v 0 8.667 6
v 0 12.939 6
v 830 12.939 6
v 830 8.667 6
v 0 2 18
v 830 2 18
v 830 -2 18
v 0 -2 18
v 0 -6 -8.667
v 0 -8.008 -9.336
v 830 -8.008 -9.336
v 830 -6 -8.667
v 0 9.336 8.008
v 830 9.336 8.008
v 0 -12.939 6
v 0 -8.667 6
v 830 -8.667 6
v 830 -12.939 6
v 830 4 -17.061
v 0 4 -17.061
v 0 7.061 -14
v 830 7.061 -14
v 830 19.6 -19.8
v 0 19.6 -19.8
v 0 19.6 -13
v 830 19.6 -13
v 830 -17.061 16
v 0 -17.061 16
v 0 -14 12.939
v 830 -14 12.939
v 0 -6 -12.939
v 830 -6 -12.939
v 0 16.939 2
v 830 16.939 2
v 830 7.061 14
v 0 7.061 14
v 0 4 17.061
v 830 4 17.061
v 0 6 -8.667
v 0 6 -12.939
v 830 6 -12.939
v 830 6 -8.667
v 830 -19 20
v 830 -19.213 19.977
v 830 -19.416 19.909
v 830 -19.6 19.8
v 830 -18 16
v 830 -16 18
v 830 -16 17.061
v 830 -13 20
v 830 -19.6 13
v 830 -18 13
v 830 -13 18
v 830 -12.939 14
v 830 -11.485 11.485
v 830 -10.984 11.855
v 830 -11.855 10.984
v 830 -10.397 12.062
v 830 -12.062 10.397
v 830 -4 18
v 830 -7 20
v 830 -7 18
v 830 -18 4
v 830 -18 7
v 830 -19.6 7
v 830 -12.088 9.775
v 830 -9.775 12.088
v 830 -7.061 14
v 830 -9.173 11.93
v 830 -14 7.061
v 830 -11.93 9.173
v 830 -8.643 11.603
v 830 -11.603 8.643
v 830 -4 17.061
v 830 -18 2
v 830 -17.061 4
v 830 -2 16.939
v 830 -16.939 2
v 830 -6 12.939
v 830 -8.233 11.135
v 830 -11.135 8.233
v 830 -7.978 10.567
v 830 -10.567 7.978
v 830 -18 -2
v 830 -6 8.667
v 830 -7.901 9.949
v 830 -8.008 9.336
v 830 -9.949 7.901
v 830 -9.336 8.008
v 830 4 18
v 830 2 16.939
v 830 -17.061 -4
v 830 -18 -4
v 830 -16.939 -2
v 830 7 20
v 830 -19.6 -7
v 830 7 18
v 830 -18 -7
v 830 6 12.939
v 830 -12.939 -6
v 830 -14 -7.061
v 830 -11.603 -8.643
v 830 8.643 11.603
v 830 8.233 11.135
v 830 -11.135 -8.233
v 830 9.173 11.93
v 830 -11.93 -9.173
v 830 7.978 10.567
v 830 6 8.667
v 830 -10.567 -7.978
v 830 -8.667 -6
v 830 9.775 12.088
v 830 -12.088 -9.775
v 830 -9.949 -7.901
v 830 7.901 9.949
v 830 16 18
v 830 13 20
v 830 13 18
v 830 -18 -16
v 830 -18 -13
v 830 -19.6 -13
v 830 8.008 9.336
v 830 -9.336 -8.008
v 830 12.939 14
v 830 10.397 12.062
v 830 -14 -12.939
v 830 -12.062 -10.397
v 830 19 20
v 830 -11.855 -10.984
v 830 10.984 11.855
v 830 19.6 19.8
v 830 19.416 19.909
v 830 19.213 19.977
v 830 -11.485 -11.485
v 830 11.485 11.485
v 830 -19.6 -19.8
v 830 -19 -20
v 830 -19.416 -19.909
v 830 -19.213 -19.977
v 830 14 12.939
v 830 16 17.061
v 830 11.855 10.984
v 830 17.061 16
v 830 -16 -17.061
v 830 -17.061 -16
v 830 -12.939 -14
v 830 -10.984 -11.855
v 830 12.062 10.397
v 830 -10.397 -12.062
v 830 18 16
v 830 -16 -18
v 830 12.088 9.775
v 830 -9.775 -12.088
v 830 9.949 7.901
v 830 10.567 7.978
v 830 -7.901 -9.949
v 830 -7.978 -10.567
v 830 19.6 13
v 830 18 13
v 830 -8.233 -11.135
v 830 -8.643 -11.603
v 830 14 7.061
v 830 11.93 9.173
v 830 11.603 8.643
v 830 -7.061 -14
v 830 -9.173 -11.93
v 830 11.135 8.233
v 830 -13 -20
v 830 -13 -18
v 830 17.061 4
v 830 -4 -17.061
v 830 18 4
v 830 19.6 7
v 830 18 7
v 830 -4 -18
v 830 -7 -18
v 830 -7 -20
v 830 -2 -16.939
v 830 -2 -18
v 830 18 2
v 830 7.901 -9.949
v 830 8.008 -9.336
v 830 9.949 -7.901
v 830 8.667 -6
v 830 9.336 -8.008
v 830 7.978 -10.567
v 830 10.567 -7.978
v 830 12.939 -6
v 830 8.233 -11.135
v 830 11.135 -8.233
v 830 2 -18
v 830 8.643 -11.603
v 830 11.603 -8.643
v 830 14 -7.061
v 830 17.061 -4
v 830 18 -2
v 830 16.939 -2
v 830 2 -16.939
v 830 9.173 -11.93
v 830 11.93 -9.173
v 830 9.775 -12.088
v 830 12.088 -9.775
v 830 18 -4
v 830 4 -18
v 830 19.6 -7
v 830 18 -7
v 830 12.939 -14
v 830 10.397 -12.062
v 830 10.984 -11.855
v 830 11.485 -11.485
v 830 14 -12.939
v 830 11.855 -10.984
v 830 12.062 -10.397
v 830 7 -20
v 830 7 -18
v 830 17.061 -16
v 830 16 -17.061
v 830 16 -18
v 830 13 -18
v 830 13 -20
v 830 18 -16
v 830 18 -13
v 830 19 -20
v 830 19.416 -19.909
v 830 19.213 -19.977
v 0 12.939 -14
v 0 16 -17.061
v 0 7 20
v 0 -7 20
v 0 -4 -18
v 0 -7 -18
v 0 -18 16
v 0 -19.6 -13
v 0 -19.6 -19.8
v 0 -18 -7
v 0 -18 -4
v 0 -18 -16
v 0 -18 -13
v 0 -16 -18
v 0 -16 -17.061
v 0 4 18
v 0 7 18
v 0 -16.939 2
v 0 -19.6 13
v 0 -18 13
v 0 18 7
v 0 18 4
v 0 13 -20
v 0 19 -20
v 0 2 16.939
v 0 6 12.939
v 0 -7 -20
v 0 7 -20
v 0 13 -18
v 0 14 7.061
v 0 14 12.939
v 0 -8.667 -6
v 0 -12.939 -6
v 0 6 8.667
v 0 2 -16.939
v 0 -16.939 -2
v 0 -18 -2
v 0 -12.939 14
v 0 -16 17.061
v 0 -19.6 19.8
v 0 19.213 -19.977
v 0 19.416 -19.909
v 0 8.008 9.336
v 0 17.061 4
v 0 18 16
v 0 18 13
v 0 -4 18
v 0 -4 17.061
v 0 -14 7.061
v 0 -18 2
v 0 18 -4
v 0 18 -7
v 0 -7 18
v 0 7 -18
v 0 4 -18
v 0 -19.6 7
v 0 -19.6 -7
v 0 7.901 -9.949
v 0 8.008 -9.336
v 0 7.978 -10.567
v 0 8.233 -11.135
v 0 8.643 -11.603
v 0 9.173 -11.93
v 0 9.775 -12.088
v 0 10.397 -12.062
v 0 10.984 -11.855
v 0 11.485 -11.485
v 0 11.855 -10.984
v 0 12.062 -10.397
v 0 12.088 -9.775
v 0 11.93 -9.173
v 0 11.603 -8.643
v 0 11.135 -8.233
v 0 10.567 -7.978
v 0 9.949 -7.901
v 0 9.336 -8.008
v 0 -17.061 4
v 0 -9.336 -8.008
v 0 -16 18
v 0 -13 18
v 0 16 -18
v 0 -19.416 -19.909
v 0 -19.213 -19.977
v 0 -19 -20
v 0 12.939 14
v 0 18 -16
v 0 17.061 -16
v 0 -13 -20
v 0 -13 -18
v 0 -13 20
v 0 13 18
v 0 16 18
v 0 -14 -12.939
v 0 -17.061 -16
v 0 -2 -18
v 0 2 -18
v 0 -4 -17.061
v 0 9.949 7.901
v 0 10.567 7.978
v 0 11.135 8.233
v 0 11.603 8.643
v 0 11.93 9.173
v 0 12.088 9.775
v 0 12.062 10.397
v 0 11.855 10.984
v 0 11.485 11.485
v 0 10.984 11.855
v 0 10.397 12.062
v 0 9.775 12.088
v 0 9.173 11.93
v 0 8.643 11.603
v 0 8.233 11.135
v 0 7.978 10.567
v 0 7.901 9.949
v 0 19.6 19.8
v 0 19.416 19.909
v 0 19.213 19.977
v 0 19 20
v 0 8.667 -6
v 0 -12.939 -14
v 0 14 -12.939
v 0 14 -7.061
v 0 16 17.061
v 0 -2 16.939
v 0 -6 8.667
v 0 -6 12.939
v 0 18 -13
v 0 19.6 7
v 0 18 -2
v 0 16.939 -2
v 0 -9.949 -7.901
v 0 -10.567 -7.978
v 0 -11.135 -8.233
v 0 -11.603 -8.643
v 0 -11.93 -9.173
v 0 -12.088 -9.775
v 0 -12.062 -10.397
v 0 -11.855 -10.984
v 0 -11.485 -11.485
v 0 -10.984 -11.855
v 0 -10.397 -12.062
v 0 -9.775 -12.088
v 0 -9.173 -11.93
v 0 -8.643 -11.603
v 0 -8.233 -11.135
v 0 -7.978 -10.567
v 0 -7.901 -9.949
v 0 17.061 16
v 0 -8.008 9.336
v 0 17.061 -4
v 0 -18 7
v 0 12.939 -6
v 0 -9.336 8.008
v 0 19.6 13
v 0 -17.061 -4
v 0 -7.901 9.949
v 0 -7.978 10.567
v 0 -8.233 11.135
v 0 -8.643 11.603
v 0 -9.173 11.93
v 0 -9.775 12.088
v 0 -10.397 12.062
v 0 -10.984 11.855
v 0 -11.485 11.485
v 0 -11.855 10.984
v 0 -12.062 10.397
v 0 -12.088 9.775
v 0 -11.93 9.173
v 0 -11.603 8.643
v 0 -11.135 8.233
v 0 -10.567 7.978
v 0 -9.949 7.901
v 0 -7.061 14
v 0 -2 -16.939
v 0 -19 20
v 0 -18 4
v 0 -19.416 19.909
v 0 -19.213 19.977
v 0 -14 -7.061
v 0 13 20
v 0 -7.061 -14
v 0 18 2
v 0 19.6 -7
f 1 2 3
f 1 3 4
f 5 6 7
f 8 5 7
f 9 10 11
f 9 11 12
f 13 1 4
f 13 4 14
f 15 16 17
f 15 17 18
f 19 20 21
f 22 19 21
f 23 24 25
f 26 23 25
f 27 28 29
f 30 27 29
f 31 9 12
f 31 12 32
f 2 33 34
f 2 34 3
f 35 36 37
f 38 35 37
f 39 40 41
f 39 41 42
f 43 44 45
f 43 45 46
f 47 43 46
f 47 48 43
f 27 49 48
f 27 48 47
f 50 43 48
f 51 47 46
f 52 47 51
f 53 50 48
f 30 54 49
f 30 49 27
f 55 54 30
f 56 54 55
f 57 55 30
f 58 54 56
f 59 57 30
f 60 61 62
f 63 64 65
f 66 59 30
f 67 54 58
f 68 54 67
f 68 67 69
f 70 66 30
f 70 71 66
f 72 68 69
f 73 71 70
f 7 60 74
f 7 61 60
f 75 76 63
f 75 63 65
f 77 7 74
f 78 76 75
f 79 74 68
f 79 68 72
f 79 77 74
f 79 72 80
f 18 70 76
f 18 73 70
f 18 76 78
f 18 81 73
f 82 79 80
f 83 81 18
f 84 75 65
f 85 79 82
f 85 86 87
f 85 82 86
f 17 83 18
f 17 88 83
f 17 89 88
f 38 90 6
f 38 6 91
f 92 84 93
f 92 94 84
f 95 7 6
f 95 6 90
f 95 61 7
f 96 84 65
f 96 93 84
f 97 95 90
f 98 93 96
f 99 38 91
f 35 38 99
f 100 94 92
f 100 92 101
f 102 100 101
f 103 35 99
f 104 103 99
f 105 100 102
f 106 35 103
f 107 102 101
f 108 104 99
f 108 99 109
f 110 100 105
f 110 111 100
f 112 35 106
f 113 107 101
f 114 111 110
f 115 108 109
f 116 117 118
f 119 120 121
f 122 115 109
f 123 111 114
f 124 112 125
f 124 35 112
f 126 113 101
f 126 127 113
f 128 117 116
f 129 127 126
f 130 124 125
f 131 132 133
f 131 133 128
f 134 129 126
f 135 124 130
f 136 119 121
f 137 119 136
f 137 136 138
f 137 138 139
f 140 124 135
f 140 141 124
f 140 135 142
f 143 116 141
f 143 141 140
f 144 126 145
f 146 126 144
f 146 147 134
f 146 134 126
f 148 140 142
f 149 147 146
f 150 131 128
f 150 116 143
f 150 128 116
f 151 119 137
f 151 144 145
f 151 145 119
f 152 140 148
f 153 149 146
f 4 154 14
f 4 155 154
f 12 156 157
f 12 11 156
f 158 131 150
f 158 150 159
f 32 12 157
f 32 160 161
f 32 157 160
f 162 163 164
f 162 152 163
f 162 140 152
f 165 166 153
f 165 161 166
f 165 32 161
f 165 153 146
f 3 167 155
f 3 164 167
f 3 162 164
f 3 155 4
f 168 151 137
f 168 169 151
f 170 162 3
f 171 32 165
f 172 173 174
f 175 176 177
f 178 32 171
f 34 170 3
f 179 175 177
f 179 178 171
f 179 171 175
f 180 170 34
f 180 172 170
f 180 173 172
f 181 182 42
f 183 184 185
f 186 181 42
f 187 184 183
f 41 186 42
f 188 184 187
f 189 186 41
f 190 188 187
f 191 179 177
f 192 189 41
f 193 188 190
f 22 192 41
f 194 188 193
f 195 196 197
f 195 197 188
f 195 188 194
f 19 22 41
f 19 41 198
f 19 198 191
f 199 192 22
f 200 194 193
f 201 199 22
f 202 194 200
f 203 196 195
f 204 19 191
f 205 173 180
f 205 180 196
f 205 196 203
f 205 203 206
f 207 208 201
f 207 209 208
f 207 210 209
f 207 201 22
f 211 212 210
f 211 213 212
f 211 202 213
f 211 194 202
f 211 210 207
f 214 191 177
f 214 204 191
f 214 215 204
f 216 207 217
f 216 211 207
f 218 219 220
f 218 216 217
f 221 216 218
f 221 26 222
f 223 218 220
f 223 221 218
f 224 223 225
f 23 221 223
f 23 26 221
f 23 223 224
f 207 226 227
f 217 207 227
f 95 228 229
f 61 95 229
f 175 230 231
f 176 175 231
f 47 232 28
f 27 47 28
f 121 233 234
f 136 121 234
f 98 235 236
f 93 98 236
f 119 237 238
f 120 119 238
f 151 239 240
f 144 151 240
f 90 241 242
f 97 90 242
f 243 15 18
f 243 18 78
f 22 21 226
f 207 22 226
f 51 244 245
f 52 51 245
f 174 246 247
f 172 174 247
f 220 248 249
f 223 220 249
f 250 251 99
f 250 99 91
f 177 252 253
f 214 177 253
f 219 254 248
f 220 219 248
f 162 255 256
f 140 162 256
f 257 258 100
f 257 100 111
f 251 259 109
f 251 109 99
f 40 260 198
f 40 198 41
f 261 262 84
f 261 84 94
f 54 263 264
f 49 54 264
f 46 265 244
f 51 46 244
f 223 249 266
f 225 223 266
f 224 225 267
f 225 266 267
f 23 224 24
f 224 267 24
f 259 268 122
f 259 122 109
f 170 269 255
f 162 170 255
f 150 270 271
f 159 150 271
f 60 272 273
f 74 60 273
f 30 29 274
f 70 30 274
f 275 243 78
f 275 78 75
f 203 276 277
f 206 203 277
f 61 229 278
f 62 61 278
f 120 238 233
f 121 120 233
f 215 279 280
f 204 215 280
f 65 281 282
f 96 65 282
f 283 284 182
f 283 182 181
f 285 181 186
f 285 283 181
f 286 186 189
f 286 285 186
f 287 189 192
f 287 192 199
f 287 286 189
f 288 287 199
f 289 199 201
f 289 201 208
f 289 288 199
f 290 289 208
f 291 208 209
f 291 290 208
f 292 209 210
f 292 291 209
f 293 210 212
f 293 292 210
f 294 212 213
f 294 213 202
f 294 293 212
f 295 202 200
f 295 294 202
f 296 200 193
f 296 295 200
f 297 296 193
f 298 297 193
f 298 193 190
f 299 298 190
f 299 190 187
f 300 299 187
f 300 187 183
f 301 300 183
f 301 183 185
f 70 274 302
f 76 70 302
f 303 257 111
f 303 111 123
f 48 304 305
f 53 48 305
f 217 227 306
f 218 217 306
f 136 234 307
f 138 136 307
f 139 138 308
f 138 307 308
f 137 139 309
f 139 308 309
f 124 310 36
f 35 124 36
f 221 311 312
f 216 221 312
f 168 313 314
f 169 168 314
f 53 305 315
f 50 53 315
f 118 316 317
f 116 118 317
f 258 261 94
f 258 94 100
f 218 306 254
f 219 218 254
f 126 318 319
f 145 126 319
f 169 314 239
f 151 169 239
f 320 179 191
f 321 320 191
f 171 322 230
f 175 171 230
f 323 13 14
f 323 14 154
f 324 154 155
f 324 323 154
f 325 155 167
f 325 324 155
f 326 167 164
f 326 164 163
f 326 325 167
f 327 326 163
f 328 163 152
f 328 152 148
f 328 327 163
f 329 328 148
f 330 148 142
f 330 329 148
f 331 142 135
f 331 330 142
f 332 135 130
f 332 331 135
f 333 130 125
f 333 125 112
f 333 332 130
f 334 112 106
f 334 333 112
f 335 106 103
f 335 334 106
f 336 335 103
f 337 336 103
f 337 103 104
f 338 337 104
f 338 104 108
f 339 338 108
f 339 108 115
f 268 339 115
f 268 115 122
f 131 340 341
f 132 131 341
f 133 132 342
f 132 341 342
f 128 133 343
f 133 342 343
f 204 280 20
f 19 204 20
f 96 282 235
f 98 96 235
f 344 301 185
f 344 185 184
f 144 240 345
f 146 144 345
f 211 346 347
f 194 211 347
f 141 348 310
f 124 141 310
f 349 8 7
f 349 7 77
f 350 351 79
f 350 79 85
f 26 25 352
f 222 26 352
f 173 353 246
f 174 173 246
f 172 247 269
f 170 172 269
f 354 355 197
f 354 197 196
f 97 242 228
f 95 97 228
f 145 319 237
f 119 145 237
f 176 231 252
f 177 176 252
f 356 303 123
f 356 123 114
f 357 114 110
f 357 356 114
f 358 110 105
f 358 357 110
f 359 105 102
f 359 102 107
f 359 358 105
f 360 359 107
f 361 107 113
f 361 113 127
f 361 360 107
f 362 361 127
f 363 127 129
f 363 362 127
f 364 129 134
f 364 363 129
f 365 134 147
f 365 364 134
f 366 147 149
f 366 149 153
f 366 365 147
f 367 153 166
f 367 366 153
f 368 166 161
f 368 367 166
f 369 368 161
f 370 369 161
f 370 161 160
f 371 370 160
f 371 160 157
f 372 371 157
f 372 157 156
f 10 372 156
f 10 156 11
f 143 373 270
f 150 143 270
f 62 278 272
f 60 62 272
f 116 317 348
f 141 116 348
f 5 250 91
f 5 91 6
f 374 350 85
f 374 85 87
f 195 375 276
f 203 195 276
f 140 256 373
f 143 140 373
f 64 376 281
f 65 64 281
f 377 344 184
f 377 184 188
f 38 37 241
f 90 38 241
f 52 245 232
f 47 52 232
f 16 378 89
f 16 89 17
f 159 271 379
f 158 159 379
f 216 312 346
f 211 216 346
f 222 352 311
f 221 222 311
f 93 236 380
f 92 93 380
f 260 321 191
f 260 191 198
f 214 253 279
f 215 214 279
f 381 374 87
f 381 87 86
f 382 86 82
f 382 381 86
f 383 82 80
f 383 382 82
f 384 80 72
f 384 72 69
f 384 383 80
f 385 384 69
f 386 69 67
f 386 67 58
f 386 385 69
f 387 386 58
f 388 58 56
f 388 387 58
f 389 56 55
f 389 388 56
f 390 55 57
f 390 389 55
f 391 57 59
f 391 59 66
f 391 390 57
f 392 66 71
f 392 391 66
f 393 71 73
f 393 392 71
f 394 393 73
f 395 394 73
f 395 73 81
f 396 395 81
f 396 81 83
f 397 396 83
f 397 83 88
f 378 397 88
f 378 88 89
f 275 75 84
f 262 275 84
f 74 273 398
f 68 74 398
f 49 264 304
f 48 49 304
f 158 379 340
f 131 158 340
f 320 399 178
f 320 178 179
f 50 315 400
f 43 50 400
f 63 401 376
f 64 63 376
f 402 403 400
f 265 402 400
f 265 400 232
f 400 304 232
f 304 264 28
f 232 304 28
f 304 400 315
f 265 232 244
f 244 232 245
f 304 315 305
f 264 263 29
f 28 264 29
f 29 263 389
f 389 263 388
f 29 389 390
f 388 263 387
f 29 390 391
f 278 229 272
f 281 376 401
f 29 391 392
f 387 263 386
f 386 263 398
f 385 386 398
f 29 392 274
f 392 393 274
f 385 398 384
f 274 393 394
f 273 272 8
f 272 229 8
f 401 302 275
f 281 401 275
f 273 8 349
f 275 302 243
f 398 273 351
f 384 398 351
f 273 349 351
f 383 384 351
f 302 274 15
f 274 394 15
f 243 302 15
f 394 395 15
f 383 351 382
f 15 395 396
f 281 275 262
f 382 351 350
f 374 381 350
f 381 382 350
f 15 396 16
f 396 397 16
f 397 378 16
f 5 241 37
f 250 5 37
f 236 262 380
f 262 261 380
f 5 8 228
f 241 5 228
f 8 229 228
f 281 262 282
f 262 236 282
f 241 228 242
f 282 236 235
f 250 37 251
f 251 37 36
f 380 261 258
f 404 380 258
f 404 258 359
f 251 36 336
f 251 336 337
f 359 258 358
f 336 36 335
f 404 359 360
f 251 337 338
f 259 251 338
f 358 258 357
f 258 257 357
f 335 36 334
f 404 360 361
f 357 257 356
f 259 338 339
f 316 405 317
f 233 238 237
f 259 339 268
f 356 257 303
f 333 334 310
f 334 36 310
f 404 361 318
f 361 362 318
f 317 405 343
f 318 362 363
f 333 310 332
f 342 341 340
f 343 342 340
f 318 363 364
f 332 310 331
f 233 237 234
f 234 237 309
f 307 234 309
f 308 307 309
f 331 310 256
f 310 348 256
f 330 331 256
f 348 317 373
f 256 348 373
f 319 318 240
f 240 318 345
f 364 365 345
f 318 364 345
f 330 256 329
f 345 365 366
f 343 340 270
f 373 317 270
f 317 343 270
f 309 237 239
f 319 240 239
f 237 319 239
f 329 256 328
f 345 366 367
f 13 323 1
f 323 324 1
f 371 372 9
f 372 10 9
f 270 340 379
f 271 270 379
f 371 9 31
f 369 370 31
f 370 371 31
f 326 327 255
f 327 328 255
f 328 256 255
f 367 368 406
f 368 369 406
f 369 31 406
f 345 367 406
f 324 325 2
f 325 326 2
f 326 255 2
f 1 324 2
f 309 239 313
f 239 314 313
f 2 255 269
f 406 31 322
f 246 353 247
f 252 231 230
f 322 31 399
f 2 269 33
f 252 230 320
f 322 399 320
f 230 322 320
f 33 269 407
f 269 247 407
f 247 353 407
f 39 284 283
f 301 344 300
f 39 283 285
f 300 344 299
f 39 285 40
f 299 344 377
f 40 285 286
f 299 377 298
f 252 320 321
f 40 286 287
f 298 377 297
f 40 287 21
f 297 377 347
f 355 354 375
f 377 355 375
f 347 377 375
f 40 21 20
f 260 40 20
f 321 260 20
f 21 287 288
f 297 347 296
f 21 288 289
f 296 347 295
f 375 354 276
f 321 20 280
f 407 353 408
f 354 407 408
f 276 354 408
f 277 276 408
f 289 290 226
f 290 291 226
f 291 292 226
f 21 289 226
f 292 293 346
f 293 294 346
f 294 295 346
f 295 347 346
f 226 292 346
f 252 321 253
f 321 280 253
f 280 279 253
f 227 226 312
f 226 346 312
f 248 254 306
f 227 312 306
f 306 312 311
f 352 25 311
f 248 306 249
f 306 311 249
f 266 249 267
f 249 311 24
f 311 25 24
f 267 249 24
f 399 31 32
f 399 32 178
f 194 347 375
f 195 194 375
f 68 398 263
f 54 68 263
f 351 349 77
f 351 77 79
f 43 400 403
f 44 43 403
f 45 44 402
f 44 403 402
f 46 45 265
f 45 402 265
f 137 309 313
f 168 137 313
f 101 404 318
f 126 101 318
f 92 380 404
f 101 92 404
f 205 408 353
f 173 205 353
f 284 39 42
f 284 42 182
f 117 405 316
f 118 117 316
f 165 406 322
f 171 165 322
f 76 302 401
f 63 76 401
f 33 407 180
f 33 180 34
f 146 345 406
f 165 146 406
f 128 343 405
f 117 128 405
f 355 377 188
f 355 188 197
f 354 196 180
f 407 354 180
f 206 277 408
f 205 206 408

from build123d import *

# Parameters (mm, degrees)
BOSS_EXTRUDE1_DEPTH = 830


with BuildPart() as part:
    # Sketch1 → Boss-Extrude1 (new body)
    with BuildSketch(Plane(origin=(0, 0, 0), x_dir=(0, 0, -1), z_dir=(1, 0, 0))):
        with BuildLine():
            Line((-20, 19), (-20, 13))
            Line((-20, 13), (-18, 13))
            Line((-18, 13), (-18, 16))
            Line((-18, 16), (-17.060660172, 16))
            Line((-17.060660172, 16), (-14, 12.939339828))
            Line((-14, 12.939339828), (-14, 7.060660172))
            Line((-14, 7.060660172), (-17.060660172, 4))
            Line((-17.060660172, 4), (-18, 4))
            Line((-18, 4), (-18, 7))
            Line((-18, 7), (-20, 7))
            Line((-20, 7), (-20, -7))
            Line((-20, -7), (-18, -7))
            Line((-18, -7), (-18, -4))
            Line((-18, -4), (-17.060660172, -4))
            Line((-17.060660172, -4), (-14, -7.060660172))
            Line((-14, -7.060660172), (-14, -12.939339828))
            Line((-14, -12.939339828), (-17.060660172, -16))
            Line((-17.060660172, -16), (-18, -16))
            Line((-18, -16), (-18, -13))
            Line((-18, -13), (-20, -13))
            Line((-20, -13), (-20, -19))
            ThreePointArc((-20, -19), (-19.948683298, -19.316227766), (-19.8, -19.6))
            Line((-19.8, -19.6), (-13, -19.6))
            Line((-13, -19.6), (-13, -18))
            Line((-13, -18), (-16, -18))
            Line((-16, -18), (-16, -17.060660172))
            Line((-16, -17.060660172), (-12.939339828, -14))
            Line((-12.939339828, -14), (-7.060660172, -14))
            Line((-7.060660172, -14), (-4, -17.060660172))
            Line((-4, -17.060660172), (-4, -18))
            Line((-4, -18), (-7, -18))
            Line((-7, -18), (-7, -19.6))
            Line((-7, -19.6), (7, -19.6))
            Line((7, -19.6), (7, -18))
            Line((7, -18), (4, -18))
            Line((4, -18), (4, -17.060660172))
            Line((4, -17.060660172), (7.060660172, -14))
            Line((7.060660172, -14), (12.939339828, -14))
            Line((12.939339828, -14), (16, -17.060660172))
            Line((16, -17.060660172), (16, -18))
            Line((16, -18), (13, -18))
            Line((13, -18), (13, -19.6))
            Line((13, -19.6), (19.8, -19.6))
            ThreePointArc((19.8, -19.6), (19.948683298, -19.316227766), (20, -19))
            Line((20, -19), (20, -13))
            Line((20, -13), (18, -13))
            Line((18, -13), (18, -16))
            Line((18, -16), (17.060660172, -16))
            Line((17.060660172, -16), (14, -12.939339828))
            Line((14, -12.939339828), (14, -7.060660172))
            Line((14, -7.060660172), (17.060660172, -4))
            Line((17.060660172, -4), (18, -4))
            Line((18, -4), (18, -7))
            Line((18, -7), (20, -7))
            Line((20, -7), (20, 7))
            Line((20, 7), (18, 7))
            Line((18, 7), (18, 4))
            Line((18, 4), (17.060660172, 4))
            Line((17.060660172, 4), (14, 7.060660172))
            Line((14, 7.060660172), (14, 12.939339828))
            Line((14, 12.939339828), (17.060660172, 16))
            Line((17.060660172, 16), (18, 16))
            Line((18, 16), (18, 13))
            Line((18, 13), (20, 13))
            Line((20, 13), (20, 19))
            ThreePointArc((20, 19), (19.948683298, 19.316227766), (19.8, 19.6))
            Line((19.8, 19.6), (13, 19.6))
            Line((13, 19.6), (13, 18))
            Line((13, 18), (16, 18))
            Line((16, 18), (16, 17.060660172))
            Line((16, 17.060660172), (12.939339828, 14))
            Line((12.939339828, 14), (7.060660172, 14))
            Line((7.060660172, 14), (4, 17.060660172))
            Line((4, 17.060660172), (4, 18))
            Line((4, 18), (7, 18))
            Line((7, 18), (7, 19.6))
            Line((7, 19.6), (-7, 19.6))
            Line((-7, 19.6), (-7, 18))
            Line((-7, 18), (-4, 18))
            Line((-4, 18), (-4, 17.060660172))
            Line((-4, 17.060660172), (-7.060660172, 14))
            Line((-7.060660172, 14), (-12.939339828, 14))
            Line((-12.939339828, 14), (-16, 17.060660172))
            Line((-16, 17.060660172), (-16, 18))
            Line((-16, 18), (-13, 18))
            Line((-13, 18), (-13, 19.6))
            Line((-13, 19.6), (-19.8, 19.6))
            ThreePointArc((-19.8, 19.6), (-19.948683298, 19.316227766), (-20, 19))
        make_face()
        with BuildLine():
            Line((-16.939339828, 2), (-18, 2))
            Line((-18, 2), (-18, -2))
            Line((-18, -2), (-16.939339828, -2))
            Line((-16.939339828, -2), (-12.939339828, -6))
            Line((-12.939339828, -6), (-8.666662697, -6))
            Line((-8.666662697, -6), (-9.335919912, -8.007765667))
            ThreePointArc((-9.335919912, -8.007765667), (-11.48492424, -11.48492424), (-8.007765667, -9.335919912))
            Line((-8.007765667, -9.335919912), (-6, -8.666662697))
            Line((-6, -8.666662697), (-6, -12.939339828))
            Line((-6, -12.939339828), (-2, -16.939339828))
            Line((-2, -16.939339828), (-2, -18))
            Line((-2, -18), (2, -18))
            Line((2, -18), (2, -16.939339828))
            Line((2, -16.939339828), (6, -12.939339828))
            Line((6, -12.939339828), (6, -8.666662697))
            Line((6, -8.666662697), (8.007765667, -9.335919912))
            ThreePointArc((8.007765667, -9.335919912), (11.48492424, -11.48492424), (9.335919912, -8.007765667))
            Line((9.335919912, -8.007765667), (8.666662697, -6))
            Line((8.666662697, -6), (12.939339828, -6))
            Line((12.939339828, -6), (16.939339828, -2))
            Line((16.939339828, -2), (18, -2))
            Line((18, -2), (18, 2))
            Line((18, 2), (16.939339828, 2))
            Line((16.939339828, 2), (12.939339828, 6))
            Line((12.939339828, 6), (8.666662697, 6))
            Line((8.666662697, 6), (9.335919912, 8.007765667))
            ThreePointArc((9.335919912, 8.007765667), (11.48492424, 11.48492424), (8.007765667, 9.335919912))
            Line((8.007765667, 9.335919912), (6, 8.666662697))
            Line((6, 8.666662697), (6, 12.939339828))
            Line((6, 12.939339828), (2, 16.939339828))
            Line((2, 16.939339828), (2, 18))
            Line((2, 18), (-2, 18))
            Line((-2, 18), (-2, 16.939339828))
            Line((-2, 16.939339828), (-6, 12.939339828))
            Line((-6, 12.939339828), (-6, 8.666662697))
            Line((-6, 8.666662697), (-8.007765667, 9.335919912))
            ThreePointArc((-8.007765667, 9.335919912), (-11.48492424, 11.48492424), (-9.335919912, 8.007765667))
            Line((-9.335919912, 8.007765667), (-8.666662697, 6))
            Line((-8.666662697, 6), (-12.939339828, 6))
            Line((-12.939339828, 6), (-16.939339828, 2))
        make_face(mode=Mode.SUBTRACT)
    extrude(amount=BOSS_EXTRUDE1_DEPTH)


solid = part.part
